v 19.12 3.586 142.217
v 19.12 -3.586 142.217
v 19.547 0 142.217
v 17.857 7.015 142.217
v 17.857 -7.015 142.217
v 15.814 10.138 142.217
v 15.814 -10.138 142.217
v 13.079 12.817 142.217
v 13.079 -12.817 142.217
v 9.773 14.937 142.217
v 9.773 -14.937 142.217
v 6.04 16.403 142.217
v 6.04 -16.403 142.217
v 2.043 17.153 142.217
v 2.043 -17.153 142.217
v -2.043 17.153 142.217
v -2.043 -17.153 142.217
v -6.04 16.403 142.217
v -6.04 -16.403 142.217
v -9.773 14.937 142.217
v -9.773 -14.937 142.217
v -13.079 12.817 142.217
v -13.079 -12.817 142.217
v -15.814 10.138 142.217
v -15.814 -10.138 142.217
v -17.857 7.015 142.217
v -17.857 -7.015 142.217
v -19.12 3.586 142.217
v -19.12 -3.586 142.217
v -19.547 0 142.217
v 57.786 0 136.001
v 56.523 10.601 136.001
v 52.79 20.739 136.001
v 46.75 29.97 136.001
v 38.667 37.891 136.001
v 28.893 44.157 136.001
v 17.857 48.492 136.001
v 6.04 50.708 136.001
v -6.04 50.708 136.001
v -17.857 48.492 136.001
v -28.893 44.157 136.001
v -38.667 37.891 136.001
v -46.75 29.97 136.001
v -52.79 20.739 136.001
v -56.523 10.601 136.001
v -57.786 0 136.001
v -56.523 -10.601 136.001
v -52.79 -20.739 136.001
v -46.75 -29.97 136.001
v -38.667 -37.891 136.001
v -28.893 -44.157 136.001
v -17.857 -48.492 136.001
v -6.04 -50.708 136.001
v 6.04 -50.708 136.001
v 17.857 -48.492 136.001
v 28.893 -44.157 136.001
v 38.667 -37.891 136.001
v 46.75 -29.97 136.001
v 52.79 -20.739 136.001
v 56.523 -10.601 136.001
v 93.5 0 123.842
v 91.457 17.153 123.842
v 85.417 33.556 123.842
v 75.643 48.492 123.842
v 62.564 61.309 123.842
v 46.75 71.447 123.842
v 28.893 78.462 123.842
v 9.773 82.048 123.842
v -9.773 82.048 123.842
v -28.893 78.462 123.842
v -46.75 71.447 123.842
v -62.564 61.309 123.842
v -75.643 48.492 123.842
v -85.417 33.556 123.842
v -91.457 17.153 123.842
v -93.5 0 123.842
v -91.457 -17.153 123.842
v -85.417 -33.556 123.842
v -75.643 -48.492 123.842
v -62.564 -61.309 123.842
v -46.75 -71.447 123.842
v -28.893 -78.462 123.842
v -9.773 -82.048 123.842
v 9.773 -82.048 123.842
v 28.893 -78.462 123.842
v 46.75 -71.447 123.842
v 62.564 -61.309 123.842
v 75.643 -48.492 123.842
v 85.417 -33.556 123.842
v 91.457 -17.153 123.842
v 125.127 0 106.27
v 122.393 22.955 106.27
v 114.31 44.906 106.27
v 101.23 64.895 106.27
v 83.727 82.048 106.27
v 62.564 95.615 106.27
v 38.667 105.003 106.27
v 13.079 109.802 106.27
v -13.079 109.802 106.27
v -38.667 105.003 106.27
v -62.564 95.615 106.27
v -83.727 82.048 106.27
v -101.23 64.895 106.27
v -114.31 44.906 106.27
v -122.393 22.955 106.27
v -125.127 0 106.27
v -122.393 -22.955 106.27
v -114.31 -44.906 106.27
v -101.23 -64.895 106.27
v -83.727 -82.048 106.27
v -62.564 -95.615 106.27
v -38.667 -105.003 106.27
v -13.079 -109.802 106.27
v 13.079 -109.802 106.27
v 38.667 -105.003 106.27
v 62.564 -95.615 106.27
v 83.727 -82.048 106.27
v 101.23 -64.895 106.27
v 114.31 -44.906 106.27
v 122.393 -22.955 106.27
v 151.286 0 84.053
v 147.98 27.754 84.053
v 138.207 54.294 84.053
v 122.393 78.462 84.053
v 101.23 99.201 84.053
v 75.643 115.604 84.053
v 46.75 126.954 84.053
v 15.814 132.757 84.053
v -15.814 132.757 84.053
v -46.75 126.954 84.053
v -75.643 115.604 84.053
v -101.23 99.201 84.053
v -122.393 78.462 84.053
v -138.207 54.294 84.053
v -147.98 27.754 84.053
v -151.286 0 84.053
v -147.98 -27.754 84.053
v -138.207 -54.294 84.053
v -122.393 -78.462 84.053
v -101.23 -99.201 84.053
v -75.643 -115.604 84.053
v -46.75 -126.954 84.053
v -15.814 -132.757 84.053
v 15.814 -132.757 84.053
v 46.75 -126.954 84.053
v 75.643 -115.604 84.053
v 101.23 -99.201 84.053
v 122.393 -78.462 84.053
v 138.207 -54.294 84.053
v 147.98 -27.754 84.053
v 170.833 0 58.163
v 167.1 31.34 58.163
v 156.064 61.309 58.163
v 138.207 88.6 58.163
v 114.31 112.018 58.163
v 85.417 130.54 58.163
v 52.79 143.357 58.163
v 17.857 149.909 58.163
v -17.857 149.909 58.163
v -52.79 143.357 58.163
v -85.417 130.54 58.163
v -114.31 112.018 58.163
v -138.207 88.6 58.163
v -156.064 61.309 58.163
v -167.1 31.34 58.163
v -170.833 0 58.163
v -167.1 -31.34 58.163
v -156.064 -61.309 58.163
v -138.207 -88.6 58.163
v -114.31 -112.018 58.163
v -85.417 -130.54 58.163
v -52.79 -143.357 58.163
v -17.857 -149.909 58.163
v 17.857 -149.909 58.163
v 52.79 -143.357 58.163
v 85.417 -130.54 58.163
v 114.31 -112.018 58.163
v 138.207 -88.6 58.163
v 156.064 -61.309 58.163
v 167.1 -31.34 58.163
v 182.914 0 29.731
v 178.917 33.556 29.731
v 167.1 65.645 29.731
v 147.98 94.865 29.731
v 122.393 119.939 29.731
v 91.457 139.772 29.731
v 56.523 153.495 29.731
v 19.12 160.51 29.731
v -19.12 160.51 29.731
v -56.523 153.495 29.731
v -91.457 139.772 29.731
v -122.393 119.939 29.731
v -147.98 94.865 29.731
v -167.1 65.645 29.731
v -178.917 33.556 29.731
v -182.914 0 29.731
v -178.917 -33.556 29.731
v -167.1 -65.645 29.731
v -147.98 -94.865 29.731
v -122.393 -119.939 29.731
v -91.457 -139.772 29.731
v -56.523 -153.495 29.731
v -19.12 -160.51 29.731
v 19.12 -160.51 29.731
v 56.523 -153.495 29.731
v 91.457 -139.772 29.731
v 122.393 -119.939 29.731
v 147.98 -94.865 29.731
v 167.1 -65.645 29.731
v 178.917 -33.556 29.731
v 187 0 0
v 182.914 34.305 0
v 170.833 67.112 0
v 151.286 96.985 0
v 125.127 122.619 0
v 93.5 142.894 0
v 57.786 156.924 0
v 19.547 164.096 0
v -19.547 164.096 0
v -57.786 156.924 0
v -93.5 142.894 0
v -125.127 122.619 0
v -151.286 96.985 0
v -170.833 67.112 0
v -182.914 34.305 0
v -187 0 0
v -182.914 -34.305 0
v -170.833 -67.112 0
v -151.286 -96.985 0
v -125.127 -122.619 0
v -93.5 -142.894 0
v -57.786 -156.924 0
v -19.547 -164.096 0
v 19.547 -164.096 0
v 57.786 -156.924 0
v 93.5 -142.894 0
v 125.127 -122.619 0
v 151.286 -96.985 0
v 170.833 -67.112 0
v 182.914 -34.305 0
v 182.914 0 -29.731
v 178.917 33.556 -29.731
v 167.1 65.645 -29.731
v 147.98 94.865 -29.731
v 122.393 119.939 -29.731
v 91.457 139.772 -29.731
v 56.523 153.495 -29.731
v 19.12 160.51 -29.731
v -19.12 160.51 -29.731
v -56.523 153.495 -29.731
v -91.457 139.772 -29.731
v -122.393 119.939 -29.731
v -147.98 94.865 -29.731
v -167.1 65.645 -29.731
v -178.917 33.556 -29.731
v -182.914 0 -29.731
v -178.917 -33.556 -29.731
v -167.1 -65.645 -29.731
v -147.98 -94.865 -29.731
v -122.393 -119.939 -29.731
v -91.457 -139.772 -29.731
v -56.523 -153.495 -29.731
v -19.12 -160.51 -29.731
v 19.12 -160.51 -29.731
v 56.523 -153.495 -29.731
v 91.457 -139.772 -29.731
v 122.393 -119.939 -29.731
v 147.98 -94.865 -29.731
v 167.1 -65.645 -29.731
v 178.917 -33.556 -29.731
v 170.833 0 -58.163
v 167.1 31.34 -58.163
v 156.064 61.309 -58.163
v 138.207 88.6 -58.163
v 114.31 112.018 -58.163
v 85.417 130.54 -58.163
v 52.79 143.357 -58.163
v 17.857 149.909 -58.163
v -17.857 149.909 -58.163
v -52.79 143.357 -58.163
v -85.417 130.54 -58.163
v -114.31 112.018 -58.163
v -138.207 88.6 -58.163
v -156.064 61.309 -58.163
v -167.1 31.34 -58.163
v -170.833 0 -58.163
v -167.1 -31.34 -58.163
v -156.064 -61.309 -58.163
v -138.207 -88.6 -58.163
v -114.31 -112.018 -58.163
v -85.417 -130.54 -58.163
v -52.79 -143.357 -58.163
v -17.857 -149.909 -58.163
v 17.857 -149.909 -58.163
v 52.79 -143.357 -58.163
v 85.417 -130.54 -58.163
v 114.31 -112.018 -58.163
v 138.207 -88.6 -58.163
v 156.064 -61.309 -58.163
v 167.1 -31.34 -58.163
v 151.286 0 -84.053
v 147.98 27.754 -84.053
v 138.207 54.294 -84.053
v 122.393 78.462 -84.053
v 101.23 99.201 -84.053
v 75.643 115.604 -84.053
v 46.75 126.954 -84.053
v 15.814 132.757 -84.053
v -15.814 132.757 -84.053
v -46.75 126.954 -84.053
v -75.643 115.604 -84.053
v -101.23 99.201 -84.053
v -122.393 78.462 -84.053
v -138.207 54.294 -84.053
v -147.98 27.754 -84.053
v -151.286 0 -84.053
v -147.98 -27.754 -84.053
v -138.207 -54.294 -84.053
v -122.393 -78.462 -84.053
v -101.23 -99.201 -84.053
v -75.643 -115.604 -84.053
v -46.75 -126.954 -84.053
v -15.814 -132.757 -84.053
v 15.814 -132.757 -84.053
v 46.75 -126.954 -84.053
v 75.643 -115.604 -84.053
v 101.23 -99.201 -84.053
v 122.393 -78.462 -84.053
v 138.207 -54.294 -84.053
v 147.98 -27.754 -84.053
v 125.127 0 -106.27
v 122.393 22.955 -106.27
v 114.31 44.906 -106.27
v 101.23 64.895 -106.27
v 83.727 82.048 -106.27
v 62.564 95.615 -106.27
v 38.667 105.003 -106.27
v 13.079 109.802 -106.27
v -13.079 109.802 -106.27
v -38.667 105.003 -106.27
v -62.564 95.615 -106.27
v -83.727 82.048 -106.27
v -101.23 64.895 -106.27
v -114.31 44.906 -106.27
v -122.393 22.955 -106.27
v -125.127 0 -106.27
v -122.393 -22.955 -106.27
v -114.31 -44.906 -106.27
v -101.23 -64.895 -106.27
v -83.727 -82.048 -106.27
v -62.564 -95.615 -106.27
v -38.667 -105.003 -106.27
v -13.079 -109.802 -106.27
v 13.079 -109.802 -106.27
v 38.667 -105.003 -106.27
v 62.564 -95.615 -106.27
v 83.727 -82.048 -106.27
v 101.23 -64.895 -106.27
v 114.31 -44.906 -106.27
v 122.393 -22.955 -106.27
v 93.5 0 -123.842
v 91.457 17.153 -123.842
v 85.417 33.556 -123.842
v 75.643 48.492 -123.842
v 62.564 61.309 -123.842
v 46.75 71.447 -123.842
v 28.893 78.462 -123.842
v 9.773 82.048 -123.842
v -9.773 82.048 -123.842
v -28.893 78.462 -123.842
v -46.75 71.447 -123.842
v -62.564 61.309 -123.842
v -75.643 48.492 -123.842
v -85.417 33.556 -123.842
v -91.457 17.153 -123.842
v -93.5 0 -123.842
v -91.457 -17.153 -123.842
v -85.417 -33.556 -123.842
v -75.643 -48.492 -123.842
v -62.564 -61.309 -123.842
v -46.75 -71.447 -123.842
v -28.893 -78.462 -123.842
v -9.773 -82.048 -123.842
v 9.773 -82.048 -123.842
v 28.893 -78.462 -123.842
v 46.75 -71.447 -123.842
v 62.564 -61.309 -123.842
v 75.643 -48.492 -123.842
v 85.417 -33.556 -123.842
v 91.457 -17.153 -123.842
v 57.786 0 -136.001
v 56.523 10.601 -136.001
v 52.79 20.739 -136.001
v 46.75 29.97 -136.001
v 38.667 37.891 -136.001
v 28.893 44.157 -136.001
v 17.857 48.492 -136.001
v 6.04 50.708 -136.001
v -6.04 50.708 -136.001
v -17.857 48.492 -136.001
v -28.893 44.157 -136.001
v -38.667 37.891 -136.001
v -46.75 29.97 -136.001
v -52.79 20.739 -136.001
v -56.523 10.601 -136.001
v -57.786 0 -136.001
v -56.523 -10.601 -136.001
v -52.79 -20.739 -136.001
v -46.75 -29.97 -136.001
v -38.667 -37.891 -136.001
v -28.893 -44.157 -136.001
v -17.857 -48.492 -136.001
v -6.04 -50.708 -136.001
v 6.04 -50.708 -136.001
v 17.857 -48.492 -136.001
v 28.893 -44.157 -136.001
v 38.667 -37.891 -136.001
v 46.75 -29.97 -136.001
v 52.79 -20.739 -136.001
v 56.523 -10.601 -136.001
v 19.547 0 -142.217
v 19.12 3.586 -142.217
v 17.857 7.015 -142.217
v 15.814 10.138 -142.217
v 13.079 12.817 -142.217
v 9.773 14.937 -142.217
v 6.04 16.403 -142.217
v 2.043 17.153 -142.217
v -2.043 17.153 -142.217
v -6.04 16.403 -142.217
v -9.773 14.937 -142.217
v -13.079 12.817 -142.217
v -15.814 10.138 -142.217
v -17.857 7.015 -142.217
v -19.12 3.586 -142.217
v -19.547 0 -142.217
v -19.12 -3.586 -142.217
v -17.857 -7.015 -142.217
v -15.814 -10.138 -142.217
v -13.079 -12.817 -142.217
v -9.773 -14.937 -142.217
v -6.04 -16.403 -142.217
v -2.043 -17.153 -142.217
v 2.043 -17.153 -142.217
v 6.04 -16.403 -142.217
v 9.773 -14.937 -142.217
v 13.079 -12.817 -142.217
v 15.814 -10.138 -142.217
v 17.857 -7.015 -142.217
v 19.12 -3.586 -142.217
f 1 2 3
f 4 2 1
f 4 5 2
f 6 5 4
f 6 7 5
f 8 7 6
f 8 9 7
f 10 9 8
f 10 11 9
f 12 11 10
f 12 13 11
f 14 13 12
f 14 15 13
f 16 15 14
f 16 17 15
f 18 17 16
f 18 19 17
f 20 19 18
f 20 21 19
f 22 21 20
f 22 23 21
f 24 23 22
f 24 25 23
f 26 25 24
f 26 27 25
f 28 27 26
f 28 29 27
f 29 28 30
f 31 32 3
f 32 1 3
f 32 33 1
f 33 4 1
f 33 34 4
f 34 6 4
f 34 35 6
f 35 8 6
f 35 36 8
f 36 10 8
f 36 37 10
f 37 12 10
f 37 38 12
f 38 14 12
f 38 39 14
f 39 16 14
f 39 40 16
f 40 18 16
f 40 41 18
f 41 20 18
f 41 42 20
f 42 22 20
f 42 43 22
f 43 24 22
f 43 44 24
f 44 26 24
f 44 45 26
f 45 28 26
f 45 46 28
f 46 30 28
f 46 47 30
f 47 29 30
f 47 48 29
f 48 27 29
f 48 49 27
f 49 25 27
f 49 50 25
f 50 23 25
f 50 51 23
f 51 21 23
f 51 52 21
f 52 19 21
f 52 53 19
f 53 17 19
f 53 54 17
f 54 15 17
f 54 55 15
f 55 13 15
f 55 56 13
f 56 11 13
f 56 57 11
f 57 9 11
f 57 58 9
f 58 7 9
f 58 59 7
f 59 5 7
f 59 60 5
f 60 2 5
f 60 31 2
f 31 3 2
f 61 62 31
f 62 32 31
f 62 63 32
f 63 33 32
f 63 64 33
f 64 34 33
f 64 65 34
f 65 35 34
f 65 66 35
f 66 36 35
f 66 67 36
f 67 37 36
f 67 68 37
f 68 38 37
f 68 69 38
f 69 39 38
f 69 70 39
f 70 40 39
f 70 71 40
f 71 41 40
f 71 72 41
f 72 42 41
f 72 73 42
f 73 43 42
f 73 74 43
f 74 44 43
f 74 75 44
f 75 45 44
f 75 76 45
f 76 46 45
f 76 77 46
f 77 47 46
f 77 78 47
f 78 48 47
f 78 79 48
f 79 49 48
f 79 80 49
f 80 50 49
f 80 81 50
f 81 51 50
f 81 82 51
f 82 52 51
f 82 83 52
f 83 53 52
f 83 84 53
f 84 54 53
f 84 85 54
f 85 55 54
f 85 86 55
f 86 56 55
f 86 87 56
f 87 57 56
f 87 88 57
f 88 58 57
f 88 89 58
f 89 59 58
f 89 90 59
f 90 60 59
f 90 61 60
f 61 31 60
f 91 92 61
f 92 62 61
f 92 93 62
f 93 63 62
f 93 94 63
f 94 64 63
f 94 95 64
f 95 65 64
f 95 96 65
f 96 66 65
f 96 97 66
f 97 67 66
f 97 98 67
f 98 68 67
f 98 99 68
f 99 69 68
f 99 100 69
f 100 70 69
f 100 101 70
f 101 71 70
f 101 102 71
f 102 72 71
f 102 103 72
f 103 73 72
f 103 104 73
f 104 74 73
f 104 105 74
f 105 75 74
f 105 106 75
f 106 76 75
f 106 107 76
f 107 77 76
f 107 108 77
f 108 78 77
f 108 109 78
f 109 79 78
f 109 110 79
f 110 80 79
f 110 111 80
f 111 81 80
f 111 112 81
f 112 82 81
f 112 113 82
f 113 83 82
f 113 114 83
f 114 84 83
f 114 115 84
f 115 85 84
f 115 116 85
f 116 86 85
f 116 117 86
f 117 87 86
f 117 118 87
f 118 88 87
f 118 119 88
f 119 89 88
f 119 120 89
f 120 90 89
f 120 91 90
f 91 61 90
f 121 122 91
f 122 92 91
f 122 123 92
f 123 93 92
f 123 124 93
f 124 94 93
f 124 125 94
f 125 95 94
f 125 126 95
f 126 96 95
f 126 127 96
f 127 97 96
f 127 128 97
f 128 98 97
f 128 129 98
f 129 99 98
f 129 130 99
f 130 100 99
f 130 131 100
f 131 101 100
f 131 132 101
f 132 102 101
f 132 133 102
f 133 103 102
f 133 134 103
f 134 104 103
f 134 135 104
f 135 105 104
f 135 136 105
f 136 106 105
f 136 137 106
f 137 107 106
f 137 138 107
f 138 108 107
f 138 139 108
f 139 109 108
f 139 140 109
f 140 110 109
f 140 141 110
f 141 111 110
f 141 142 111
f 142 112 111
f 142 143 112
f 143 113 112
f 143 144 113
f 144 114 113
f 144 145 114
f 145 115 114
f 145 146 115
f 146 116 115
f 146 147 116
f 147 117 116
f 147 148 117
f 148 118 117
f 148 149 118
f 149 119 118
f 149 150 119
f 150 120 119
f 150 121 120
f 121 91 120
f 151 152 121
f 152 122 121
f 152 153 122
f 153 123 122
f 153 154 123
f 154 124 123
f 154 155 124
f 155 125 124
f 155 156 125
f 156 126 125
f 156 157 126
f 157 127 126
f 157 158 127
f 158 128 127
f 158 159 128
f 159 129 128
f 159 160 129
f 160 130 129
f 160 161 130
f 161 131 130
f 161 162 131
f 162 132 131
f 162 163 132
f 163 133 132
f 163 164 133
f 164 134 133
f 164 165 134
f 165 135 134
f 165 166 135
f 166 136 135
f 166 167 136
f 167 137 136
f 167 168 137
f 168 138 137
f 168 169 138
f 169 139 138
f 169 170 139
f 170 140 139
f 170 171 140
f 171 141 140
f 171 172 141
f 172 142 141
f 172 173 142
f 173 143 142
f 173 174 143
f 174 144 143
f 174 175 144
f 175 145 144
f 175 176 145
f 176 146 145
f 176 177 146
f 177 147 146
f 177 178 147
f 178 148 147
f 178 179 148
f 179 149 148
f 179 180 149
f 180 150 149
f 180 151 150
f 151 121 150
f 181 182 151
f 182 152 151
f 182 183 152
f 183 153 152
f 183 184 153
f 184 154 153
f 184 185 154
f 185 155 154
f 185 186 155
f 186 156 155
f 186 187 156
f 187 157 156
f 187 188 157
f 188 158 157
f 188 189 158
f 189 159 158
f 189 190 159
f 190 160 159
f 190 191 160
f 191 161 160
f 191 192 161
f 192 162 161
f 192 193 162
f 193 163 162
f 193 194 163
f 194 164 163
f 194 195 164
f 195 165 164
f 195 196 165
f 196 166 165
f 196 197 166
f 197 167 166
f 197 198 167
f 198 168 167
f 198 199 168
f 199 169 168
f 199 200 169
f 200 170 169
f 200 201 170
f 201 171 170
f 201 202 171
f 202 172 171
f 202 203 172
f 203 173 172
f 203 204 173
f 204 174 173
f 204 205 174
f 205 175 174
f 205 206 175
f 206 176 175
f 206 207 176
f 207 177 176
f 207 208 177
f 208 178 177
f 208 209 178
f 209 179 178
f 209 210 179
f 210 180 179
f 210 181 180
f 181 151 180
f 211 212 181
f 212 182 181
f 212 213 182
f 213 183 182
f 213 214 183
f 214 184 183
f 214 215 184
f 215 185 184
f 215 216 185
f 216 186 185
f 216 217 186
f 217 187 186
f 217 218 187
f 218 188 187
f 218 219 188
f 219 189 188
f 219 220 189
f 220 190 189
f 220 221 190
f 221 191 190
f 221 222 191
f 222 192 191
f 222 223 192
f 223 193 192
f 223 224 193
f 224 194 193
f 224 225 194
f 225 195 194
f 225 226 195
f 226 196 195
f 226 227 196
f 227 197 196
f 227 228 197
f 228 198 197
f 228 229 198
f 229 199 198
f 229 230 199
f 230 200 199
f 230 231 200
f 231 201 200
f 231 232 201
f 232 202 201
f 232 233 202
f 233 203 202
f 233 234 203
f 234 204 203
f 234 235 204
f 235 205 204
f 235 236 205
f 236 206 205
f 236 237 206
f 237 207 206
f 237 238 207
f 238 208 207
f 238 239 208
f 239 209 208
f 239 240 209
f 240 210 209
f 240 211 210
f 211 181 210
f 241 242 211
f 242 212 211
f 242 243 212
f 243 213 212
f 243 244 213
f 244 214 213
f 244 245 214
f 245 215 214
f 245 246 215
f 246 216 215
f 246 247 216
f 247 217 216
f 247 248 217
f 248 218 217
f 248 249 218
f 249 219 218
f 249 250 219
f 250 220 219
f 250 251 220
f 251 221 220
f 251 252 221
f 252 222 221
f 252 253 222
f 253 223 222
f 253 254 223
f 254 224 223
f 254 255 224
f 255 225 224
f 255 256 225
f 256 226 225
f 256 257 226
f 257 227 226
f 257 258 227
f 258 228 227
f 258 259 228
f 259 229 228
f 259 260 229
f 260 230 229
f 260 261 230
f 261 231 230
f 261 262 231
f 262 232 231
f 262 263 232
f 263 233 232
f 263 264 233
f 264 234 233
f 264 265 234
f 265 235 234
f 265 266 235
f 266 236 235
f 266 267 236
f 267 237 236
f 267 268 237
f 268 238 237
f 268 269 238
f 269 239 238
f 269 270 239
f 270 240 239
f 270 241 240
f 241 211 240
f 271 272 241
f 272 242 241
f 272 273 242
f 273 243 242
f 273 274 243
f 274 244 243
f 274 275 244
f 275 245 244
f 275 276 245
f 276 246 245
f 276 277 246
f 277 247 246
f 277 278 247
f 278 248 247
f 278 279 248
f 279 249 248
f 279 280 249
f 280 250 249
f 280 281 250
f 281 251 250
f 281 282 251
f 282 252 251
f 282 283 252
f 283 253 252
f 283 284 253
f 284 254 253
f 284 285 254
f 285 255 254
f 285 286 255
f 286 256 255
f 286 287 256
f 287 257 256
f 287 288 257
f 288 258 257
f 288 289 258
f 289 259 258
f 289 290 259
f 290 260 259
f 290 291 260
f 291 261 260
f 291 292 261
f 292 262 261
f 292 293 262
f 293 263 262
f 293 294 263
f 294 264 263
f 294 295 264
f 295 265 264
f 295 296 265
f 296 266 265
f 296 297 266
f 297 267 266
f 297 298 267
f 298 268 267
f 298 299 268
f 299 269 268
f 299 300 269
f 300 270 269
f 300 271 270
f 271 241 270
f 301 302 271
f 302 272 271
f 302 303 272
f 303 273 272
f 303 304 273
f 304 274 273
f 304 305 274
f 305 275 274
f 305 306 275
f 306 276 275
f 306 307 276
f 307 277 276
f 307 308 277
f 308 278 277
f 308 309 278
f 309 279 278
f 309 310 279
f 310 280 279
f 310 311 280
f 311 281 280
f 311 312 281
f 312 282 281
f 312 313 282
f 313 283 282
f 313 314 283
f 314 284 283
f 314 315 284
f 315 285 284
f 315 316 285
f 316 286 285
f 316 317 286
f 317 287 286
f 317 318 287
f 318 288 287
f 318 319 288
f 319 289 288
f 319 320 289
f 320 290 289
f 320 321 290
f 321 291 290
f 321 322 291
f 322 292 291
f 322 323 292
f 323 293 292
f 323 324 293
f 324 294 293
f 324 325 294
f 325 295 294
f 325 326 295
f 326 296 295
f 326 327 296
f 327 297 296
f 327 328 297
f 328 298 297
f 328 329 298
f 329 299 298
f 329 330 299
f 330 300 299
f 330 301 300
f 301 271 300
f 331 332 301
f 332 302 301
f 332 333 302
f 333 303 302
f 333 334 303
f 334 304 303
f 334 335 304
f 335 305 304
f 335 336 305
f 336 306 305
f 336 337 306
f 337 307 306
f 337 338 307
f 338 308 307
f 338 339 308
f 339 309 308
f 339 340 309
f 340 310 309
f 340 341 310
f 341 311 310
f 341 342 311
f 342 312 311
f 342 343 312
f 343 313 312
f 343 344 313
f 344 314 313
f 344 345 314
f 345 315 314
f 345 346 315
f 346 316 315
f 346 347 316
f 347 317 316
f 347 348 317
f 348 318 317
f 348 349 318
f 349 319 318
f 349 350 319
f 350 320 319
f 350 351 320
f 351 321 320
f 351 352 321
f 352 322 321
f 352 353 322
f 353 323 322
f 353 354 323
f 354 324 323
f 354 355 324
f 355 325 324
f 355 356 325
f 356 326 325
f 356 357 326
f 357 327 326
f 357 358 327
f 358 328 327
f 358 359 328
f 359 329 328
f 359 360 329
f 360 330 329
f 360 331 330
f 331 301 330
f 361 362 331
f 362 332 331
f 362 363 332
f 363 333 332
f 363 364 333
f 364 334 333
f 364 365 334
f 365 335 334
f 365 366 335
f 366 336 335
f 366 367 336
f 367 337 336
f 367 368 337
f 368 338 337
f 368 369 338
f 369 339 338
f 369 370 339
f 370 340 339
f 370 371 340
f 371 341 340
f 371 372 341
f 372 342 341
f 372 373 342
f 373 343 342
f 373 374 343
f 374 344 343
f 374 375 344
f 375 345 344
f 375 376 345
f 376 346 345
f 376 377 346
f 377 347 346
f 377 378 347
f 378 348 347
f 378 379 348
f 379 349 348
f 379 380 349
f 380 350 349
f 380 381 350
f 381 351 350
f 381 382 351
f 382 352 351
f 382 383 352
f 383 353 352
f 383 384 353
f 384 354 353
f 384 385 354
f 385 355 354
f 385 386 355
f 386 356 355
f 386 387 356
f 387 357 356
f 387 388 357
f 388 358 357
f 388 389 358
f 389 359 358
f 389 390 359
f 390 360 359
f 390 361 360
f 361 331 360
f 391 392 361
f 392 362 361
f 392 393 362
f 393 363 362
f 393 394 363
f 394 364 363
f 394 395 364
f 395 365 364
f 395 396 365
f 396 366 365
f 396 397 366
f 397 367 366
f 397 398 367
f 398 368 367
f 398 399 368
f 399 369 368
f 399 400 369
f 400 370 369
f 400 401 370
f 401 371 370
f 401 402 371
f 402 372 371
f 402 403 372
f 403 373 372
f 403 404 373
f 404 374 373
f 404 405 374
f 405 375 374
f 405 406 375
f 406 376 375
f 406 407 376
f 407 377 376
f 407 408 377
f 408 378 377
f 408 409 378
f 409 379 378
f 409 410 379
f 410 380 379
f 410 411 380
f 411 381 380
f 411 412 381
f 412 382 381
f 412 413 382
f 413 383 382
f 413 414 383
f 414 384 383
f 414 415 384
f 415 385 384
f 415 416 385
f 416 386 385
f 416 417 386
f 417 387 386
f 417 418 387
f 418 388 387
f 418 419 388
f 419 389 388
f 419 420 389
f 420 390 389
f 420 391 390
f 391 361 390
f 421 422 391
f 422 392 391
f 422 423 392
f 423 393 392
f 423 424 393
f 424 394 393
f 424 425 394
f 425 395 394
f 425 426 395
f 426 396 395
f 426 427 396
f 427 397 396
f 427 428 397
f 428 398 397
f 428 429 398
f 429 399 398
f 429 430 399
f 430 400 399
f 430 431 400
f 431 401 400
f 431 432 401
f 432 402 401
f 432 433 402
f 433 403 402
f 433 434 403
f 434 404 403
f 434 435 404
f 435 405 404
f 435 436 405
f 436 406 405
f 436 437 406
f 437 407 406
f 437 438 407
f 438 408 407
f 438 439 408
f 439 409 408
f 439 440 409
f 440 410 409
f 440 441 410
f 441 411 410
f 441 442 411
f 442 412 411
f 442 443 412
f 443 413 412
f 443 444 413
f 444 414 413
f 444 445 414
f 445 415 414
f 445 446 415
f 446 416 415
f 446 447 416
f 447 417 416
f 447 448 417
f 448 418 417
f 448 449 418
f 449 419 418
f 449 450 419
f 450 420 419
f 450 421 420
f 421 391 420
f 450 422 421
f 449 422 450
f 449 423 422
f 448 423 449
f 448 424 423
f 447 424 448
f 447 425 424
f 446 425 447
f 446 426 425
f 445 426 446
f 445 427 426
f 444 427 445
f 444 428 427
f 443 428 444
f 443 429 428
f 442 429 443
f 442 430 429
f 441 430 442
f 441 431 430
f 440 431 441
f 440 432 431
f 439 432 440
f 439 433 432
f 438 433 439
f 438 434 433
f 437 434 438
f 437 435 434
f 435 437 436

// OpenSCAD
// Generated by SolidPython 1.0.1 on 2020-07-29 00:46:53


scale(v = [17, 15, 13]) {
	sphere(r = 11);
}
/***********************************************
*********      SolidPython code:      **********
************************************************
 
# import packages: SolidPython
from solid import *
from solid.utils import *
from itertools import chain, combinations, permutations


class Resize:

    def __init__(self, scad_file):
        self.scad_file = scad_file
        #self.scad_file = import_scad(scad_file)
        # cone/cylinder param:
        self.r1 = 0
        self.r2 = 0
        self.h = 0
        # rectangular prism param:
        self.w = 0
        self.l = 0
        # ellipse param:
        self.r = 0

    # import OpenScad code (file name corresponds to shape)


    # classify shape + parameters
    def assign(self, param1, param2, param3):
        if self.scad_file == 'cone.scad':
            self.r1 = param1
            self.r2 = param2
            self.h = param3
        elif self.scad_file == 'cylinder.scad':
            self.r1 = param1
            self.r2 = param2
            self.h = param3
        elif self.scad_file == 'rectangularPrism.scad':
            self.h = param1
            self.l = param2
            self.w = param3
        else:
            self.r = param1
            self.h = param2

    # resize parameters
    def iterate(self):
        x = range(3, 20, 2)
        i = 1
        if self.scad_file == 'cone.scad':
            tempList = list(permutations(x, 2))
            for temp in tempList:
                param1 = temp[0]
                param2 = temp[1]
                filepath = 'produced_scad_files/' + 'cone' + str(param1) + '_' + str(param2) + '_' + '.scad'
                scad_render_to_file(cylinder(h=param1, r1=param2, r2=0), filepath)

        elif self.scad_file == 'cylinder.scad':
            tempList = list(permutations(x, 3))
            for temp in tempList:
                param1 = temp[0]
                param2 = temp[1]
                filepath = 'produced_scad_files/' + 'cylinder' + str(param1) + '_' + str(param2) + '_' + '.scad'
                scad_render_to_file(cylinder(h=param1, r1=param2, r2=param2), filepath)

        elif self.scad_file == 'rectangularPrism.scad':
            tempList = list(permutations(x, 3))
            for temp in tempList:
                param1 = temp[0]
                param2 = temp[1]
                param3 = temp[2]
                filepath = 'produced_scad_files/' + 'rectangularPrism' + str(param1) + '_' + str(param2) + '_' + str(
                    param3) + '.scad'
                scad_render_to_file(cube(size=(param1, param2, param3)), filepath)

        elif self.scad_file == 'ellipse.scad':
            tempList = list(permutations(x, 4))
            for temp in tempList:
                param1 = temp[0]
                param2 = temp[1]
                param3 = temp[2]
                param4 = temp[3]
                filepath = 'produced_scad_files/' + 'ellipse' + str(param1) + '_' + str(param2) + '_' + str(param3) + '_' + str(param4) + '.scad'
                scad_render_to_file(scale([param1, param2, param3])(sphere(r=param4)), filepath)

    def render_to_scadfile(self):
        scad_render_to_file(scad, 'example.scad') 
 
************************************************/
